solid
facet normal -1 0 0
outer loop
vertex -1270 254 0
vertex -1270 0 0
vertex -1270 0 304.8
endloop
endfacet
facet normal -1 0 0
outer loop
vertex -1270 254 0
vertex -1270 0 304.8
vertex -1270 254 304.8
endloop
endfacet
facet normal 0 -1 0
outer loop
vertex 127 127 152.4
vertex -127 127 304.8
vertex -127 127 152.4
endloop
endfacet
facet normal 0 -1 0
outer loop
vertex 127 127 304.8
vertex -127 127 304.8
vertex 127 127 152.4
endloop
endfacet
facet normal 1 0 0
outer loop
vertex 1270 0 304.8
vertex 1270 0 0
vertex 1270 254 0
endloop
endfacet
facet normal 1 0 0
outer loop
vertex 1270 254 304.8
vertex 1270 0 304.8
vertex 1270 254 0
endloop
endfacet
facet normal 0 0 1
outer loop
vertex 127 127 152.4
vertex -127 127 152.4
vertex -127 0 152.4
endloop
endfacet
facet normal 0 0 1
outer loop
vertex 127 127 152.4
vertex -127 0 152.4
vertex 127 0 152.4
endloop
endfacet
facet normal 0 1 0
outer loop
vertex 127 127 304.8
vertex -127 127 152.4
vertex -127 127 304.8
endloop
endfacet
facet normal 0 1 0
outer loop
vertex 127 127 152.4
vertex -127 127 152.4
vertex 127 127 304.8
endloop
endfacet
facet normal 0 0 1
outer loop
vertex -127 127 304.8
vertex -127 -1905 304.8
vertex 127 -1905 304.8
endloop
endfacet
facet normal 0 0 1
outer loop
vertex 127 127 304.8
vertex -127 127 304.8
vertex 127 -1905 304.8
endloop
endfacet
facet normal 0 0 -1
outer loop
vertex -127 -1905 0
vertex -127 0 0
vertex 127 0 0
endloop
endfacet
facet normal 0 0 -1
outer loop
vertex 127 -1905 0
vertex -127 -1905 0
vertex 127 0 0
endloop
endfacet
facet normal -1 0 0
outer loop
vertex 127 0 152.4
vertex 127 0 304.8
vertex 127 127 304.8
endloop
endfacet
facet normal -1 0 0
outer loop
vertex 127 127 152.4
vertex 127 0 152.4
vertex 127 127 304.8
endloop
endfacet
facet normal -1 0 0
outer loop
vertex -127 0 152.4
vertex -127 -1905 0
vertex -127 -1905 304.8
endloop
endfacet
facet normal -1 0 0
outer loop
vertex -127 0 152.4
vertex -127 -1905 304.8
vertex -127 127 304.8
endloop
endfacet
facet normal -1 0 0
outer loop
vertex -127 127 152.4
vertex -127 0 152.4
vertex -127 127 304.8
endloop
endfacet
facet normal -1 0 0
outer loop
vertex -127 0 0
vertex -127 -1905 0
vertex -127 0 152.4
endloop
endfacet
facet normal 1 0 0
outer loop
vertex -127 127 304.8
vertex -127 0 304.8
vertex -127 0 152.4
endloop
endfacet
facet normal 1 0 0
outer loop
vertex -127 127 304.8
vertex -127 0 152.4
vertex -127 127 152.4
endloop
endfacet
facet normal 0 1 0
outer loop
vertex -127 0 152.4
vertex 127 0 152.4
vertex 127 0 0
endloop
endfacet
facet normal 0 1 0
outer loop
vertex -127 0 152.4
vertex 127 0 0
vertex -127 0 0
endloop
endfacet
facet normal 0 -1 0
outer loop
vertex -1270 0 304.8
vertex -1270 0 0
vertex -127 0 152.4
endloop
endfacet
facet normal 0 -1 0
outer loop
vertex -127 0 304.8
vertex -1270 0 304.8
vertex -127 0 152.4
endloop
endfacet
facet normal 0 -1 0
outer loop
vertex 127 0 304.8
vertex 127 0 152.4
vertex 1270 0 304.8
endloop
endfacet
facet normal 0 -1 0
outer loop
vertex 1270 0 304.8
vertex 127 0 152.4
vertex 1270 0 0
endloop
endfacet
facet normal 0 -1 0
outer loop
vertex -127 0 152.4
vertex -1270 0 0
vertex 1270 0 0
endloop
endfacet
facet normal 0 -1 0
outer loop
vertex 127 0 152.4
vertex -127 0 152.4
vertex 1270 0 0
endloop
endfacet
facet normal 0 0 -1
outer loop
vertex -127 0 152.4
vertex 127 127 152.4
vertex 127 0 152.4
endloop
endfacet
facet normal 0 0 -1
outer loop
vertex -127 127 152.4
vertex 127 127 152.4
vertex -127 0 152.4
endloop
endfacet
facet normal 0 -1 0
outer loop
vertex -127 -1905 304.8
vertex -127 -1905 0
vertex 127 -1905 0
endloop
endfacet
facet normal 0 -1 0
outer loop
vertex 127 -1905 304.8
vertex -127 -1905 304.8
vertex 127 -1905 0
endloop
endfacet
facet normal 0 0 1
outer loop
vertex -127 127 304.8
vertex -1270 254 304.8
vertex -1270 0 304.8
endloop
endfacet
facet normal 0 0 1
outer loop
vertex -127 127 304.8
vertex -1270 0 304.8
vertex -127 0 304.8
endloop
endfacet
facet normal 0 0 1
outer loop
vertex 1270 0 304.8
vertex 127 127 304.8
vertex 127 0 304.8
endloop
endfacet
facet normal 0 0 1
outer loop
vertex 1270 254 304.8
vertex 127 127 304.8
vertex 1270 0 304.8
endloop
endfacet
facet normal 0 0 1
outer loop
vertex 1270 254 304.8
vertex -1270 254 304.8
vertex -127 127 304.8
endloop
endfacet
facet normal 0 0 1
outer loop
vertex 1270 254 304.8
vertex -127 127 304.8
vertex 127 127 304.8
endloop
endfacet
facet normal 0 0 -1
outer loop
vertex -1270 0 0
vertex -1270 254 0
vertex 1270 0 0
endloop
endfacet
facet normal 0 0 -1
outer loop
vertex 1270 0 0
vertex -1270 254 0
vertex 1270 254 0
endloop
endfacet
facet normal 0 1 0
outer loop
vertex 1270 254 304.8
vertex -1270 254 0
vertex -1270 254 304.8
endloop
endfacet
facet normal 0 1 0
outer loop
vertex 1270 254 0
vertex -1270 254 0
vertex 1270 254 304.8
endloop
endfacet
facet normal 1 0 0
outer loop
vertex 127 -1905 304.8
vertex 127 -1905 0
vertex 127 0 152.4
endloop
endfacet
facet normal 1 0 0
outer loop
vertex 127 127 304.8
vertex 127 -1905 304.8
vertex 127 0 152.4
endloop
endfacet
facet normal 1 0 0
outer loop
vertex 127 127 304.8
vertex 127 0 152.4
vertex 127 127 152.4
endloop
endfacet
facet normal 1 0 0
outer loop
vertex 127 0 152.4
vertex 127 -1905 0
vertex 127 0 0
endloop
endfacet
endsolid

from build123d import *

# Parameters (mm, degrees)
F0_W     = 2540
F0_H     = 254
F1_DEPTH = 304.8
F2_W     = 254
F2_H     = 127
F3_DEPTH = 152.4
F4_W     = 254
F4_H     = 2032
F5_DEPTH = 304.8
F6_W     = 254
F6_H     = 152.4
F7_DEPTH = 127


with BuildPart() as f1:
    # F0 (on Top) → F1 (new body)
    with BuildSketch(Plane.XY):
        with Locations((0, 127)):
            Rectangle(F0_W, F0_H)
    extrude(amount=F1_DEPTH)

    # F2 (on face) → F3 (cut)
    with BuildSketch(Plane.XY.offset(304.8)):
        with Locations((0, 63.5)):
            Rectangle(F2_W, F2_H)
    extrude(amount=-F3_DEPTH, mode=Mode.SUBTRACT)


with BuildPart() as f5:
    # F4 (on Top) → F5 (new body)
    with BuildSketch(Plane.XY):
        with Locations((0, -889)):
            Rectangle(F4_W, F4_H)
    extrude(amount=F5_DEPTH)

    # F6 (on face) → F7 (cut)
    with BuildSketch(Plane(origin=(0, 127, 0), x_dir=(-1, 0, 0), z_dir=(0, 1, 0))):
        with Locations((0, 76.2)):
            Rectangle(F6_W, F6_H)
    extrude(amount=-F7_DEPTH, mode=Mode.SUBTRACT)


solid = Compound([f1.part, f5.part])
